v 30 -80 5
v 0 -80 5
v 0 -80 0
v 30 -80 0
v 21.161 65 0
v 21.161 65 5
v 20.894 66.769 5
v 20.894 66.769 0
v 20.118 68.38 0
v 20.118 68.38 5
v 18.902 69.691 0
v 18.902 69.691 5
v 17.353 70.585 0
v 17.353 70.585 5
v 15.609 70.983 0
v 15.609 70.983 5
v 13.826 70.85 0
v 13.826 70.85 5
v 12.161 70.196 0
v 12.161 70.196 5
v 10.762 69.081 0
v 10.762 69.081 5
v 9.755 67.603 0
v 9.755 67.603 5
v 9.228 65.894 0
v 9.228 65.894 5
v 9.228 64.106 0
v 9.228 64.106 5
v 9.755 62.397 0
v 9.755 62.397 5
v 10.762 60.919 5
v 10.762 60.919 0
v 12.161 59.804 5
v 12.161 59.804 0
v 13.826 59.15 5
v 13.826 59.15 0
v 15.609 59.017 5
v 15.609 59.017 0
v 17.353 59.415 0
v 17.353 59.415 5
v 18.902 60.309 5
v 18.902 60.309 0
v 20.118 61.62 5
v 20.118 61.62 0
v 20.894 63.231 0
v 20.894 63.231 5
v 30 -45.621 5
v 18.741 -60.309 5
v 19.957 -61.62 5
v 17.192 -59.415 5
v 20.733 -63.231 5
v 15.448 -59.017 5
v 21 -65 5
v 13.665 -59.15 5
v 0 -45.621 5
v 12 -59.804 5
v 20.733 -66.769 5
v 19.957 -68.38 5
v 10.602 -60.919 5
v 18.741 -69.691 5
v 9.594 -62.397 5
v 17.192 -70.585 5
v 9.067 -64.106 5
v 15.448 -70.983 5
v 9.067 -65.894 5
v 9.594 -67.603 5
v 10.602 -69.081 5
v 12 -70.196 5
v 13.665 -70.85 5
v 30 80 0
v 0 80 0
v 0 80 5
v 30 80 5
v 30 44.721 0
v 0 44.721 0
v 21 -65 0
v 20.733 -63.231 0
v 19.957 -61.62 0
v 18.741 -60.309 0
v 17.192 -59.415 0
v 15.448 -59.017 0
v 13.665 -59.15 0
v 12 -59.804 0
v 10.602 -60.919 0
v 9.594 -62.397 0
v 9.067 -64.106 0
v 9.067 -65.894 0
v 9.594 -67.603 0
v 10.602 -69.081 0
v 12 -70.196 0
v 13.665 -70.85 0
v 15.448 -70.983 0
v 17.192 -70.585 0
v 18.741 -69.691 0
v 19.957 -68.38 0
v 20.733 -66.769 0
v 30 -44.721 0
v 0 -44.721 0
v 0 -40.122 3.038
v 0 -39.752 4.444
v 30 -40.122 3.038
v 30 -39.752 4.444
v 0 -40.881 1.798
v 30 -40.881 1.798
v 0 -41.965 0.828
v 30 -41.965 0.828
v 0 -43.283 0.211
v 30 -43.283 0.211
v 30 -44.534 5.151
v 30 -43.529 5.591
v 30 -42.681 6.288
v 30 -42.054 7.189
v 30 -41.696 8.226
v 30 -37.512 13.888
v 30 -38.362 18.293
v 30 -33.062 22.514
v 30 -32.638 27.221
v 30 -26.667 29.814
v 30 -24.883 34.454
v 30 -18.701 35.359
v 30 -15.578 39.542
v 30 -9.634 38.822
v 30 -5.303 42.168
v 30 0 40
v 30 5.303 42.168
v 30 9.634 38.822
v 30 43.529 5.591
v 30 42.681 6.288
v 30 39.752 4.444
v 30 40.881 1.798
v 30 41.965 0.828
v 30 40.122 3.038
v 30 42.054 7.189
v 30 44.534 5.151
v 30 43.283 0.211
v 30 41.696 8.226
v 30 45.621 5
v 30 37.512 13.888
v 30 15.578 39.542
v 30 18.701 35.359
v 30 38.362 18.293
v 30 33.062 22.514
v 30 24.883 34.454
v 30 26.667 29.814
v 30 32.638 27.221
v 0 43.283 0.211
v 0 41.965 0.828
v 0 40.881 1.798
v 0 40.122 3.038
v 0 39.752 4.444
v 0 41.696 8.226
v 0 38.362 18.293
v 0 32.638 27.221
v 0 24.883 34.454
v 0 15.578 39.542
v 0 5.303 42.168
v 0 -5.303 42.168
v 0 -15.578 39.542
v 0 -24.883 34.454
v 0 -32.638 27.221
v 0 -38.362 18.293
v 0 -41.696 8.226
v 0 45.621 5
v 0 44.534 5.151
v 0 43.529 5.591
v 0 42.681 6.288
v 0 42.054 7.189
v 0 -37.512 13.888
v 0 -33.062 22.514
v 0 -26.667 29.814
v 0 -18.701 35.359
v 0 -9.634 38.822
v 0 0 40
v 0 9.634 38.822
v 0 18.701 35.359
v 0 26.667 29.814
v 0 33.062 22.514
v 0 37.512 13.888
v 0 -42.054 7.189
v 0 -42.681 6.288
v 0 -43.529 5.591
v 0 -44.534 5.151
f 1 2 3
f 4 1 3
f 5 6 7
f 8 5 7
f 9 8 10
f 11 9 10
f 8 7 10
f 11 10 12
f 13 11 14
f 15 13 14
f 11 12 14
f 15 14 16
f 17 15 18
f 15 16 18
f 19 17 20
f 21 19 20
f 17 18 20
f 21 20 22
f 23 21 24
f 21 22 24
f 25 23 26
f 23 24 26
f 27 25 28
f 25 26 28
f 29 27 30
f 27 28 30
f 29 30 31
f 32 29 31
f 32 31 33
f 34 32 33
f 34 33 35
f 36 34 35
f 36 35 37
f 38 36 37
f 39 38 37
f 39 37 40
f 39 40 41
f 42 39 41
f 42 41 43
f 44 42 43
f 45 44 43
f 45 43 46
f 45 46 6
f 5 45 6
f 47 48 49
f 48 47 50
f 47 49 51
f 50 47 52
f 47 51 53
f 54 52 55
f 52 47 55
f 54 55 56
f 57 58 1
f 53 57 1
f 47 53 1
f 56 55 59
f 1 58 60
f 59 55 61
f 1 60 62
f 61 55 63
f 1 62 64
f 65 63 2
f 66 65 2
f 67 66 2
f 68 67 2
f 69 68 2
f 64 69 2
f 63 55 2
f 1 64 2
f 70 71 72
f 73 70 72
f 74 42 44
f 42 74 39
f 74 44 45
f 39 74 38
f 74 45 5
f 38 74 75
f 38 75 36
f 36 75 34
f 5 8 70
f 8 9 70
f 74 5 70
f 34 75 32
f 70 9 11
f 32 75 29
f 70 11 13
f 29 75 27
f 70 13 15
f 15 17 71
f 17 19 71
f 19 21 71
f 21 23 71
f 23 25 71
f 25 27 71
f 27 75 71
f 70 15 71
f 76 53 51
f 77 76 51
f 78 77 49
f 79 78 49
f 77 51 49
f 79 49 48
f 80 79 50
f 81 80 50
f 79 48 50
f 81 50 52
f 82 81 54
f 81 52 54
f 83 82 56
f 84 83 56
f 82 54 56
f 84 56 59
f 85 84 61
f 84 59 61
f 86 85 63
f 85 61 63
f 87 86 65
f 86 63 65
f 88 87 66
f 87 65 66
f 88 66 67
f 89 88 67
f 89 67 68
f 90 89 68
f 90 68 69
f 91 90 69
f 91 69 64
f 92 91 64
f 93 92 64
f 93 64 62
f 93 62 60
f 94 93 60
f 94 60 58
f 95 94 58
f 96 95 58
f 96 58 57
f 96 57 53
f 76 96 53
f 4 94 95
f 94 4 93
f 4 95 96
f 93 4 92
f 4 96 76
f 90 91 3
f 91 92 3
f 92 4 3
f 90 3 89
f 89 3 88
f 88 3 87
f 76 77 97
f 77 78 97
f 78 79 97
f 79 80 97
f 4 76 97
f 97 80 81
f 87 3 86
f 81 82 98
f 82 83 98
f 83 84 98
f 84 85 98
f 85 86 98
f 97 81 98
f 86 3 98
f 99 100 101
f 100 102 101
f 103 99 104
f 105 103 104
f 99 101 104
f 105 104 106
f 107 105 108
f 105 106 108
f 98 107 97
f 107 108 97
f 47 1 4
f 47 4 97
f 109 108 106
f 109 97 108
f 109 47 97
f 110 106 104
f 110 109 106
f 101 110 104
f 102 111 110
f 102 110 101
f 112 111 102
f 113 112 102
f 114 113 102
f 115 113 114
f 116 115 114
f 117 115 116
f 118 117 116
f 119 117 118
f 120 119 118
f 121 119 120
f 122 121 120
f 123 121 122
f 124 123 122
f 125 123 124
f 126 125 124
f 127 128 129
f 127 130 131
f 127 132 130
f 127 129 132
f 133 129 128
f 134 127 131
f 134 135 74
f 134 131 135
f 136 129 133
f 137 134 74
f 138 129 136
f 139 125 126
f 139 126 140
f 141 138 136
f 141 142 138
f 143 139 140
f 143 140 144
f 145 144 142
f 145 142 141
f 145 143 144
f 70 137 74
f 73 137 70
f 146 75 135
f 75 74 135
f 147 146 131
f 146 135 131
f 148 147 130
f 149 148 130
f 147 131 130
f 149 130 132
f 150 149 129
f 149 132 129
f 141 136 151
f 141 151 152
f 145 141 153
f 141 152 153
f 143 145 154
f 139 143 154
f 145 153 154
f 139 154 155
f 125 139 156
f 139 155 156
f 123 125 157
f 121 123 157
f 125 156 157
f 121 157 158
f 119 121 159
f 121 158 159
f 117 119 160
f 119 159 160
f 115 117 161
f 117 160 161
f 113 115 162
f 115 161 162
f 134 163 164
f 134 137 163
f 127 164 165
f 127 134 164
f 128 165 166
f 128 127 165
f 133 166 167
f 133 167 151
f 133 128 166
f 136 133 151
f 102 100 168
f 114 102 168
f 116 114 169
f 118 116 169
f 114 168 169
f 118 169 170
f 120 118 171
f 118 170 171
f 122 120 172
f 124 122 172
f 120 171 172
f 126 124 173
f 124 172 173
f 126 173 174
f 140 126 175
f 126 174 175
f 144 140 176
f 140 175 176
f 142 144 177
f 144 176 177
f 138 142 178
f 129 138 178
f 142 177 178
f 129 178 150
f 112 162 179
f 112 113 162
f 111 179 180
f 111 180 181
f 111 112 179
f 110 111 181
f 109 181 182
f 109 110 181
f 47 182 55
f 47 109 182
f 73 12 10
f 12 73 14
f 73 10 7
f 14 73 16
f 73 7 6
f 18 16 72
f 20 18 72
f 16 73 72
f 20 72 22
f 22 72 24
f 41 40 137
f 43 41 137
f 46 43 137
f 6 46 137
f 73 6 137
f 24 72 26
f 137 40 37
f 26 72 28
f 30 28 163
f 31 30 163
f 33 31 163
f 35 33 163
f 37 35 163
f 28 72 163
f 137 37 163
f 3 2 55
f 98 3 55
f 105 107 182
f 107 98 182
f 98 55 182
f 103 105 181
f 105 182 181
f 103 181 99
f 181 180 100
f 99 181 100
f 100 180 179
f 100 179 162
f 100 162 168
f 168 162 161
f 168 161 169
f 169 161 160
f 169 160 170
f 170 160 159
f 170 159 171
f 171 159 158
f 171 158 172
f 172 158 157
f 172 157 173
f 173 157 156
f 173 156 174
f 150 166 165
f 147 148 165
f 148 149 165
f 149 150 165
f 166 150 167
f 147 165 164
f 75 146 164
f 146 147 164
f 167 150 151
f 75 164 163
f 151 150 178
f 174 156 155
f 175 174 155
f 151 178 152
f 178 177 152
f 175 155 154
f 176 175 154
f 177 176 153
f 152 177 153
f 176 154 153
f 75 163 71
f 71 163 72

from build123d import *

# Parameters (mm, degrees)
F1_DEPTH = 30
F2_R     = 4
F3_R     = 5
F4_R     = 6
F5_DEPTH = 25


with BuildPart() as f1:
    # F0 (on Right) → F1 (new body)
    with BuildSketch(Plane.YZ):
        with BuildLine():
            Line((80, 5), (42.204858, 5))
            ThreePointArc((42.204858, 5), (0, 42.5), (-42.204858, 5))
            Line((-42.204858, 5), (-80, 5))
            Line((-80, 5), (-80, 0))
            Line((-80, 0), (-40, 0))
            ThreePointArc((-40, 0), (0, 40), (40, 0))
            Line((40, 0), (80, 0))
            Line((80, 0), (80, 5))
        make_face()
    extrude(amount=F1_DEPTH)

    # F2
    f2_edges = [f1.edges().sort_by_distance(p)[0] for p in [
        (15, -42.204858, 5),
        (15, 42.204858, 5),
    ]]
    fillet(f2_edges, radius=F2_R)

    # F3
    f3_edges = [f1.edges().sort_by_distance(p)[0] for p in [
        (15, -40, 0),
        (15, 40, 0),
    ]]
    fillet(f3_edges, radius=F3_R)

    # F4 (on face) → F5 (cut)
    with BuildSketch(Plane.XY.offset(5)):
        with Locations((15, -65)):
            Circle(F4_R)
        with Locations((15.160678, 65)):
            Circle(F4_R)
    extrude(amount=-F5_DEPTH, mode=Mode.SUBTRACT)


solid = f1.part
